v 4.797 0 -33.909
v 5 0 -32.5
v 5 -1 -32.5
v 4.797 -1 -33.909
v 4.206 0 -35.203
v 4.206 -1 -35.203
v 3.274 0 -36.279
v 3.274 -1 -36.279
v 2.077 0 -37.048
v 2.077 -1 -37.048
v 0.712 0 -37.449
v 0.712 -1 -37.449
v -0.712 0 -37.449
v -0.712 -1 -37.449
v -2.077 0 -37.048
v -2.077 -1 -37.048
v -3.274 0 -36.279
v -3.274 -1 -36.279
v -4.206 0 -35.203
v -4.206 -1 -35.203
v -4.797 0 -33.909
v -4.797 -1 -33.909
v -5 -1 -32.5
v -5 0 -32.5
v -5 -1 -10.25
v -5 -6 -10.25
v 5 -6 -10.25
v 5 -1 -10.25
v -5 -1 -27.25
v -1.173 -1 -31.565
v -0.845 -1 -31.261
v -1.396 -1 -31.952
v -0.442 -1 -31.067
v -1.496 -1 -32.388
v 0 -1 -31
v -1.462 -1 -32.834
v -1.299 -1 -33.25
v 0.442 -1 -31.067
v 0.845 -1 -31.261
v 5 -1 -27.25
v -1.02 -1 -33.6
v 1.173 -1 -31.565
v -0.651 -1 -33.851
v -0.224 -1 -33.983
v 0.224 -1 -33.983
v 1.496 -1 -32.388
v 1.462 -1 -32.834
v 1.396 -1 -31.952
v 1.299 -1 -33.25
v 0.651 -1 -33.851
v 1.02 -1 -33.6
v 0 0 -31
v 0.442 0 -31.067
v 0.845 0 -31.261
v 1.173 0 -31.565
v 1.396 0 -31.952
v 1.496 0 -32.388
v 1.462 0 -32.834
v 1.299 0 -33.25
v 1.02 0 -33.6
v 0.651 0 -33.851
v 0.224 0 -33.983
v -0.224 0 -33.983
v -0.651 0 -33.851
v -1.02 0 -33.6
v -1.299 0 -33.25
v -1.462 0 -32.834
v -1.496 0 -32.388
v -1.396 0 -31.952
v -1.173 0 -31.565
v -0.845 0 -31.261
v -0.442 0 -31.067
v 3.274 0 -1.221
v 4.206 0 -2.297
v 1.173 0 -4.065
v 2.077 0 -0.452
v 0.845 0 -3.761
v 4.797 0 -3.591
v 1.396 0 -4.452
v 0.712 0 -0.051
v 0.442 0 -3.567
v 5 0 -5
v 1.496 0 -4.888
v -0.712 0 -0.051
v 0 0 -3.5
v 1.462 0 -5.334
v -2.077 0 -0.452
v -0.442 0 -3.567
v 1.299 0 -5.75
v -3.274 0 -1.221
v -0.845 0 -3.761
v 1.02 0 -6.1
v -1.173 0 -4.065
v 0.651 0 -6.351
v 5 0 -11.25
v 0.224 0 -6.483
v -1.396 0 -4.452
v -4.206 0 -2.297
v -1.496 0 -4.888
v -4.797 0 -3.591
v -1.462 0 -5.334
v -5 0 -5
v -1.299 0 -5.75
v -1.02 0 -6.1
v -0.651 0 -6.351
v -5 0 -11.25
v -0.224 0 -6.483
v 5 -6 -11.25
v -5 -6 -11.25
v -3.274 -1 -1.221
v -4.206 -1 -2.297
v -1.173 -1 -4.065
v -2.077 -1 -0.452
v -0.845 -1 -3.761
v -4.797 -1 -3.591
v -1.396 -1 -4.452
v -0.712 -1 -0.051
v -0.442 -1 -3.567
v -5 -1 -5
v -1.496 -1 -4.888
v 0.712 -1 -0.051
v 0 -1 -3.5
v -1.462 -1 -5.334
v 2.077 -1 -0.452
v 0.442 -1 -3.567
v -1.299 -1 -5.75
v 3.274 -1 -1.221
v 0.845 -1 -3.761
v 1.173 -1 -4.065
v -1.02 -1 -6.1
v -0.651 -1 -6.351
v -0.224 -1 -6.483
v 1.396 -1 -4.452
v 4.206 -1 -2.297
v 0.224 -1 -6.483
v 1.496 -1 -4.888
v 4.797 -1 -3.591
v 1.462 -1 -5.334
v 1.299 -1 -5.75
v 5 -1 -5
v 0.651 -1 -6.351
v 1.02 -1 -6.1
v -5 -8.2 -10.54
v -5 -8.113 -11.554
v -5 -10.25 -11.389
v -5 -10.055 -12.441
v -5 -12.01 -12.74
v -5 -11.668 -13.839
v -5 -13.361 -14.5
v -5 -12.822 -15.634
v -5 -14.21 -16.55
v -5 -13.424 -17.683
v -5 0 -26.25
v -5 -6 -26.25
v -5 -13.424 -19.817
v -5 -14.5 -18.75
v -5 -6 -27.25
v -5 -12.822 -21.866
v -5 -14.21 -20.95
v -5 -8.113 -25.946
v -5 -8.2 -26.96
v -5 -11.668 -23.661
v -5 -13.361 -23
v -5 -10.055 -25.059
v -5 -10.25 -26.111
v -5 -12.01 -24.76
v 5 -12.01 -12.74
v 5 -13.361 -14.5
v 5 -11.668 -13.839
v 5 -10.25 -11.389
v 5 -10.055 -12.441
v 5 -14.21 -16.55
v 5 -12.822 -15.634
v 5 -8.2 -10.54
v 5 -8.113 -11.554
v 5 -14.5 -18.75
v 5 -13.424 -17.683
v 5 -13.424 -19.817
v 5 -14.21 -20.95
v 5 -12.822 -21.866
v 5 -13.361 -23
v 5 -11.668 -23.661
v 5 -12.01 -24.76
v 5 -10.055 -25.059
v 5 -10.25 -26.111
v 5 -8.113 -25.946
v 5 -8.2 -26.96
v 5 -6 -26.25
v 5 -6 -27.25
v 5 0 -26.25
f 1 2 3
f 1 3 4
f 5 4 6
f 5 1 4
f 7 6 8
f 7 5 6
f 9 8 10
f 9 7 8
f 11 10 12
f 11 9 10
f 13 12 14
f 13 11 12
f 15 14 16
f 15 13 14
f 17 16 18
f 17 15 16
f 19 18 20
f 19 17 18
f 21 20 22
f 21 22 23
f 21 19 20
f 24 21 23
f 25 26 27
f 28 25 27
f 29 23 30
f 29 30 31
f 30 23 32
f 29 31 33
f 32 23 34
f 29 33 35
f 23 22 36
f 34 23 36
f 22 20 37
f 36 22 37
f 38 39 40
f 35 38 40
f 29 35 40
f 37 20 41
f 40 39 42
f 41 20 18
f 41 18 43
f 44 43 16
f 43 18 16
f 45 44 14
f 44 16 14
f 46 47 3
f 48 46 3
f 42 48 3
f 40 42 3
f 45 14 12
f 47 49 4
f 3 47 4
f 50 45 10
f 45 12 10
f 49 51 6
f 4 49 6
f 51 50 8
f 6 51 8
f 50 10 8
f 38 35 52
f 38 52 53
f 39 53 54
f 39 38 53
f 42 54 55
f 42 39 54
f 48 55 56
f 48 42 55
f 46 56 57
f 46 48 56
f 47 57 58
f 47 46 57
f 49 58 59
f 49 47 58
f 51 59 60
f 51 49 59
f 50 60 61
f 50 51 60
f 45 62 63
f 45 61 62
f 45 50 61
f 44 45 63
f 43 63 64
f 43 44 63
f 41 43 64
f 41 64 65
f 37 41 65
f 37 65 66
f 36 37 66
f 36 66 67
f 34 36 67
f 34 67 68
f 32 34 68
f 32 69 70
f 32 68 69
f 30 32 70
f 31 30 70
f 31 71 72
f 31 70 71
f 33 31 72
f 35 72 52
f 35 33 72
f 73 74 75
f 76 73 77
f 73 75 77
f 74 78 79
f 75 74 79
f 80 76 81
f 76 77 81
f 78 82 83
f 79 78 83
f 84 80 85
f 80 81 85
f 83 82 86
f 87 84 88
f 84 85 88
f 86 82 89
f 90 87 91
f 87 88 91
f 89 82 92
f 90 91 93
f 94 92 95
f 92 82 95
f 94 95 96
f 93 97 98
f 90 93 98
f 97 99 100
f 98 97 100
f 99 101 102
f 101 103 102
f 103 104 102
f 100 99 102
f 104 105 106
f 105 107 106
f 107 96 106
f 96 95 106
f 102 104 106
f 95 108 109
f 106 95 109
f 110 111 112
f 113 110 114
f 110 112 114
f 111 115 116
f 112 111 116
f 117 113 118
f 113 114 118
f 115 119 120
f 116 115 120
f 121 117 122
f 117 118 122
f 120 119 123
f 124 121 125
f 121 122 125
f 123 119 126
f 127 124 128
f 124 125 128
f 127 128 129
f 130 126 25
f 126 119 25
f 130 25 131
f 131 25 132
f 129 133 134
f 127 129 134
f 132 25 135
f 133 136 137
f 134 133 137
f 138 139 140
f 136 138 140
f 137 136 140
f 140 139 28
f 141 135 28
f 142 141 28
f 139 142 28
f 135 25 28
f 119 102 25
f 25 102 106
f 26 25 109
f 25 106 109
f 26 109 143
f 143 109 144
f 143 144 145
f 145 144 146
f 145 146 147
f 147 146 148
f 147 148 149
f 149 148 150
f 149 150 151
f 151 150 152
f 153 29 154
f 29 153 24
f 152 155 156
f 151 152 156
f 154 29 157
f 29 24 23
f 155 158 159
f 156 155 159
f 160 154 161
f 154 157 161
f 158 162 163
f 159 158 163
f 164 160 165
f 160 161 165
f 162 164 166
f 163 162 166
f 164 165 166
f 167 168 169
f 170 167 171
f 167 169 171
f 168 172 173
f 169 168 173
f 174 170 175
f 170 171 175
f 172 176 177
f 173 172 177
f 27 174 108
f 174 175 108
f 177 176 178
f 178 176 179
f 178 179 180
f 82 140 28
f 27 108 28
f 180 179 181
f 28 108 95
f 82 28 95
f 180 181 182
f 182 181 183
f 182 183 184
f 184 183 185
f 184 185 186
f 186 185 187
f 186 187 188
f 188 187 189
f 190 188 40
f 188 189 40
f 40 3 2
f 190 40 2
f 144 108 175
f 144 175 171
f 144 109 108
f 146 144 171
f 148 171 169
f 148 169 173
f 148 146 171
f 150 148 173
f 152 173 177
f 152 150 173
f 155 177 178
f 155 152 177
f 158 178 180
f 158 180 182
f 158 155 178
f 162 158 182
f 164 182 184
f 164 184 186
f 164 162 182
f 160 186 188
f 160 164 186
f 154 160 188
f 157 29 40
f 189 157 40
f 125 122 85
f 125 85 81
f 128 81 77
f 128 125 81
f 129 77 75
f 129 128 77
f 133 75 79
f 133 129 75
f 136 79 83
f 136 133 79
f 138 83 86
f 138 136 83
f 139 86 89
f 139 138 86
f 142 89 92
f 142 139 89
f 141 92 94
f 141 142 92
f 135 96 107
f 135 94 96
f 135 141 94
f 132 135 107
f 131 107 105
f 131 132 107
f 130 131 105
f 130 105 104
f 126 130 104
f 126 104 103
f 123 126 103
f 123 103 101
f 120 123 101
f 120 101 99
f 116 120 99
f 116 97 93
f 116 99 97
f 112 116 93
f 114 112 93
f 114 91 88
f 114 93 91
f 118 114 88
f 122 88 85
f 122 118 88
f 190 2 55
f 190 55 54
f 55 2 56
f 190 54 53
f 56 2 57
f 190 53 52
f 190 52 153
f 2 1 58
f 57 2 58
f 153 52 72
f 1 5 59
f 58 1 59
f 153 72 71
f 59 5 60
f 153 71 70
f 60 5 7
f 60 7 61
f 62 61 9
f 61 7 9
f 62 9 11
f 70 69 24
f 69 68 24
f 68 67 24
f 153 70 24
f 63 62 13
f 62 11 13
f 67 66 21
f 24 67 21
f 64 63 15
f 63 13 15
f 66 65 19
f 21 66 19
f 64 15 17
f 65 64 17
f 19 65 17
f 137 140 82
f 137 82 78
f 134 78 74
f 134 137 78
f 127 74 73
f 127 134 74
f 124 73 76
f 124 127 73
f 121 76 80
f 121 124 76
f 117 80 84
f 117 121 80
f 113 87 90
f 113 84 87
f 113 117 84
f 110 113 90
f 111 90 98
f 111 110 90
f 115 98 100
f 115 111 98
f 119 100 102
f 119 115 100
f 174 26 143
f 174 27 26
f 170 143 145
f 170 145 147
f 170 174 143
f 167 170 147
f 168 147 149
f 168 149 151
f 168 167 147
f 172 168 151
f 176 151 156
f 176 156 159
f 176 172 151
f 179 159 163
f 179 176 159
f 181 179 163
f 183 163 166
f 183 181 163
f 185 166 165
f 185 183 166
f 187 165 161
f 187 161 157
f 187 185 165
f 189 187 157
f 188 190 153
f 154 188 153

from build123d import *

# Parameters (mm, degrees)
SKETCH2_W               = 10
SKETCH2_H               = 1
FILLET3_RADIUS          = 5
FILLET3_LENGTH          = 1
FILLET4_RADIUS          = 5
FILLET4_LENGTH          = 1
CUT_EXTRUDE1_DEPTH      = 41.51542916
CUT_EXTRUDE1_DEPTH_BACK = 41.51542916
SKETCH3_R               = 1.5


with BuildPart() as part:
    # Sweep1: sweep along a path in Sketch1
    with BuildLine(Plane(origin=(0, 0, 0), x_dir=(0, 0, -1), z_dir=(1, 0, 0))) as sweep1_path:
        Line((0, 0), (11.25, 0))
        Line((11.25, 0), (11.25, -6))
        ThreePointArc((11.25, -6), (18.75, -13.5), (26.25, -6))
        Line((26.25, -6), (26.25, 0))
        Line((26.25, 0), (37.5, 0))
    # Sketch2 → Sweep1 (sweep)
    with BuildSketch(Plane.XY):
        with Locations((0, -0.5)):
            Rectangle(SKETCH2_W, SKETCH2_H)
    sweep(path=sweep1_path.line, transition=Transition.RIGHT)

    # Fillet3: full round fillet: the end face becomes a half cylinder, R = half its width
    fillet3_face = Plane((0, -0.5, 0), x_dir=(0, -1, 0), z_dir=(0, 0, 1))  # on the end face: x along it, z out of the body
    fillet3_slab = fillet3_face.offset(-FILLET3_RADIUS / 2) * Box(FILLET3_LENGTH, 2 * FILLET3_RADIUS, FILLET3_RADIUS, mode=Mode.PRIVATE)  # the body's end, R deep
    fillet3_round = Plane((0, -0.5, -5), x_dir=(0, 0, 1), z_dir=(0, -1, 0)) * Cylinder(FILLET3_RADIUS, FILLET3_LENGTH, mode=Mode.PRIVATE)  # its axis R under the face
    add(fillet3_slab - fillet3_round, mode=Mode.SUBTRACT)

    # Fillet4: full round fillet: the end face becomes a half cylinder, R = half its width
    fillet4_face = Plane((0, -0.5, -37.5), x_dir=(0, 1, 0), z_dir=(0, 0, -1))  # on the end face: x along it, z out of the body
    fillet4_slab = fillet4_face.offset(-FILLET4_RADIUS / 2) * Box(FILLET4_LENGTH, 2 * FILLET4_RADIUS, FILLET4_RADIUS, mode=Mode.PRIVATE)  # the body's end, R deep
    fillet4_round = Plane((0, -0.5, -32.5), x_dir=(0, 0, -1), z_dir=(0, 1, 0)) * Cylinder(FILLET4_RADIUS, FILLET4_LENGTH, mode=Mode.PRIVATE)  # its axis R under the face
    add(fillet4_slab - fillet4_round, mode=Mode.SUBTRACT)

    # Sketch3 → Cut-Extrude1 (cut, two sides: drawn at the far end of the back side and taken through both)
    with BuildSketch(Plane(origin=(0, 0, 0), x_dir=(1, 0, 0), z_dir=(0, 1, 0)).offset(-CUT_EXTRUDE1_DEPTH_BACK)):
        with Locations(Location((0, 5, 0), (0, 0, 270))):
            Circle(SKETCH3_R)
        with Locations(Location((0, 32.5, 0), (0, 0, 270))):
            Circle(SKETCH3_R)
    extrude(amount=CUT_EXTRUDE1_DEPTH + CUT_EXTRUDE1_DEPTH_BACK, mode=Mode.SUBTRACT)


solid = part.part
